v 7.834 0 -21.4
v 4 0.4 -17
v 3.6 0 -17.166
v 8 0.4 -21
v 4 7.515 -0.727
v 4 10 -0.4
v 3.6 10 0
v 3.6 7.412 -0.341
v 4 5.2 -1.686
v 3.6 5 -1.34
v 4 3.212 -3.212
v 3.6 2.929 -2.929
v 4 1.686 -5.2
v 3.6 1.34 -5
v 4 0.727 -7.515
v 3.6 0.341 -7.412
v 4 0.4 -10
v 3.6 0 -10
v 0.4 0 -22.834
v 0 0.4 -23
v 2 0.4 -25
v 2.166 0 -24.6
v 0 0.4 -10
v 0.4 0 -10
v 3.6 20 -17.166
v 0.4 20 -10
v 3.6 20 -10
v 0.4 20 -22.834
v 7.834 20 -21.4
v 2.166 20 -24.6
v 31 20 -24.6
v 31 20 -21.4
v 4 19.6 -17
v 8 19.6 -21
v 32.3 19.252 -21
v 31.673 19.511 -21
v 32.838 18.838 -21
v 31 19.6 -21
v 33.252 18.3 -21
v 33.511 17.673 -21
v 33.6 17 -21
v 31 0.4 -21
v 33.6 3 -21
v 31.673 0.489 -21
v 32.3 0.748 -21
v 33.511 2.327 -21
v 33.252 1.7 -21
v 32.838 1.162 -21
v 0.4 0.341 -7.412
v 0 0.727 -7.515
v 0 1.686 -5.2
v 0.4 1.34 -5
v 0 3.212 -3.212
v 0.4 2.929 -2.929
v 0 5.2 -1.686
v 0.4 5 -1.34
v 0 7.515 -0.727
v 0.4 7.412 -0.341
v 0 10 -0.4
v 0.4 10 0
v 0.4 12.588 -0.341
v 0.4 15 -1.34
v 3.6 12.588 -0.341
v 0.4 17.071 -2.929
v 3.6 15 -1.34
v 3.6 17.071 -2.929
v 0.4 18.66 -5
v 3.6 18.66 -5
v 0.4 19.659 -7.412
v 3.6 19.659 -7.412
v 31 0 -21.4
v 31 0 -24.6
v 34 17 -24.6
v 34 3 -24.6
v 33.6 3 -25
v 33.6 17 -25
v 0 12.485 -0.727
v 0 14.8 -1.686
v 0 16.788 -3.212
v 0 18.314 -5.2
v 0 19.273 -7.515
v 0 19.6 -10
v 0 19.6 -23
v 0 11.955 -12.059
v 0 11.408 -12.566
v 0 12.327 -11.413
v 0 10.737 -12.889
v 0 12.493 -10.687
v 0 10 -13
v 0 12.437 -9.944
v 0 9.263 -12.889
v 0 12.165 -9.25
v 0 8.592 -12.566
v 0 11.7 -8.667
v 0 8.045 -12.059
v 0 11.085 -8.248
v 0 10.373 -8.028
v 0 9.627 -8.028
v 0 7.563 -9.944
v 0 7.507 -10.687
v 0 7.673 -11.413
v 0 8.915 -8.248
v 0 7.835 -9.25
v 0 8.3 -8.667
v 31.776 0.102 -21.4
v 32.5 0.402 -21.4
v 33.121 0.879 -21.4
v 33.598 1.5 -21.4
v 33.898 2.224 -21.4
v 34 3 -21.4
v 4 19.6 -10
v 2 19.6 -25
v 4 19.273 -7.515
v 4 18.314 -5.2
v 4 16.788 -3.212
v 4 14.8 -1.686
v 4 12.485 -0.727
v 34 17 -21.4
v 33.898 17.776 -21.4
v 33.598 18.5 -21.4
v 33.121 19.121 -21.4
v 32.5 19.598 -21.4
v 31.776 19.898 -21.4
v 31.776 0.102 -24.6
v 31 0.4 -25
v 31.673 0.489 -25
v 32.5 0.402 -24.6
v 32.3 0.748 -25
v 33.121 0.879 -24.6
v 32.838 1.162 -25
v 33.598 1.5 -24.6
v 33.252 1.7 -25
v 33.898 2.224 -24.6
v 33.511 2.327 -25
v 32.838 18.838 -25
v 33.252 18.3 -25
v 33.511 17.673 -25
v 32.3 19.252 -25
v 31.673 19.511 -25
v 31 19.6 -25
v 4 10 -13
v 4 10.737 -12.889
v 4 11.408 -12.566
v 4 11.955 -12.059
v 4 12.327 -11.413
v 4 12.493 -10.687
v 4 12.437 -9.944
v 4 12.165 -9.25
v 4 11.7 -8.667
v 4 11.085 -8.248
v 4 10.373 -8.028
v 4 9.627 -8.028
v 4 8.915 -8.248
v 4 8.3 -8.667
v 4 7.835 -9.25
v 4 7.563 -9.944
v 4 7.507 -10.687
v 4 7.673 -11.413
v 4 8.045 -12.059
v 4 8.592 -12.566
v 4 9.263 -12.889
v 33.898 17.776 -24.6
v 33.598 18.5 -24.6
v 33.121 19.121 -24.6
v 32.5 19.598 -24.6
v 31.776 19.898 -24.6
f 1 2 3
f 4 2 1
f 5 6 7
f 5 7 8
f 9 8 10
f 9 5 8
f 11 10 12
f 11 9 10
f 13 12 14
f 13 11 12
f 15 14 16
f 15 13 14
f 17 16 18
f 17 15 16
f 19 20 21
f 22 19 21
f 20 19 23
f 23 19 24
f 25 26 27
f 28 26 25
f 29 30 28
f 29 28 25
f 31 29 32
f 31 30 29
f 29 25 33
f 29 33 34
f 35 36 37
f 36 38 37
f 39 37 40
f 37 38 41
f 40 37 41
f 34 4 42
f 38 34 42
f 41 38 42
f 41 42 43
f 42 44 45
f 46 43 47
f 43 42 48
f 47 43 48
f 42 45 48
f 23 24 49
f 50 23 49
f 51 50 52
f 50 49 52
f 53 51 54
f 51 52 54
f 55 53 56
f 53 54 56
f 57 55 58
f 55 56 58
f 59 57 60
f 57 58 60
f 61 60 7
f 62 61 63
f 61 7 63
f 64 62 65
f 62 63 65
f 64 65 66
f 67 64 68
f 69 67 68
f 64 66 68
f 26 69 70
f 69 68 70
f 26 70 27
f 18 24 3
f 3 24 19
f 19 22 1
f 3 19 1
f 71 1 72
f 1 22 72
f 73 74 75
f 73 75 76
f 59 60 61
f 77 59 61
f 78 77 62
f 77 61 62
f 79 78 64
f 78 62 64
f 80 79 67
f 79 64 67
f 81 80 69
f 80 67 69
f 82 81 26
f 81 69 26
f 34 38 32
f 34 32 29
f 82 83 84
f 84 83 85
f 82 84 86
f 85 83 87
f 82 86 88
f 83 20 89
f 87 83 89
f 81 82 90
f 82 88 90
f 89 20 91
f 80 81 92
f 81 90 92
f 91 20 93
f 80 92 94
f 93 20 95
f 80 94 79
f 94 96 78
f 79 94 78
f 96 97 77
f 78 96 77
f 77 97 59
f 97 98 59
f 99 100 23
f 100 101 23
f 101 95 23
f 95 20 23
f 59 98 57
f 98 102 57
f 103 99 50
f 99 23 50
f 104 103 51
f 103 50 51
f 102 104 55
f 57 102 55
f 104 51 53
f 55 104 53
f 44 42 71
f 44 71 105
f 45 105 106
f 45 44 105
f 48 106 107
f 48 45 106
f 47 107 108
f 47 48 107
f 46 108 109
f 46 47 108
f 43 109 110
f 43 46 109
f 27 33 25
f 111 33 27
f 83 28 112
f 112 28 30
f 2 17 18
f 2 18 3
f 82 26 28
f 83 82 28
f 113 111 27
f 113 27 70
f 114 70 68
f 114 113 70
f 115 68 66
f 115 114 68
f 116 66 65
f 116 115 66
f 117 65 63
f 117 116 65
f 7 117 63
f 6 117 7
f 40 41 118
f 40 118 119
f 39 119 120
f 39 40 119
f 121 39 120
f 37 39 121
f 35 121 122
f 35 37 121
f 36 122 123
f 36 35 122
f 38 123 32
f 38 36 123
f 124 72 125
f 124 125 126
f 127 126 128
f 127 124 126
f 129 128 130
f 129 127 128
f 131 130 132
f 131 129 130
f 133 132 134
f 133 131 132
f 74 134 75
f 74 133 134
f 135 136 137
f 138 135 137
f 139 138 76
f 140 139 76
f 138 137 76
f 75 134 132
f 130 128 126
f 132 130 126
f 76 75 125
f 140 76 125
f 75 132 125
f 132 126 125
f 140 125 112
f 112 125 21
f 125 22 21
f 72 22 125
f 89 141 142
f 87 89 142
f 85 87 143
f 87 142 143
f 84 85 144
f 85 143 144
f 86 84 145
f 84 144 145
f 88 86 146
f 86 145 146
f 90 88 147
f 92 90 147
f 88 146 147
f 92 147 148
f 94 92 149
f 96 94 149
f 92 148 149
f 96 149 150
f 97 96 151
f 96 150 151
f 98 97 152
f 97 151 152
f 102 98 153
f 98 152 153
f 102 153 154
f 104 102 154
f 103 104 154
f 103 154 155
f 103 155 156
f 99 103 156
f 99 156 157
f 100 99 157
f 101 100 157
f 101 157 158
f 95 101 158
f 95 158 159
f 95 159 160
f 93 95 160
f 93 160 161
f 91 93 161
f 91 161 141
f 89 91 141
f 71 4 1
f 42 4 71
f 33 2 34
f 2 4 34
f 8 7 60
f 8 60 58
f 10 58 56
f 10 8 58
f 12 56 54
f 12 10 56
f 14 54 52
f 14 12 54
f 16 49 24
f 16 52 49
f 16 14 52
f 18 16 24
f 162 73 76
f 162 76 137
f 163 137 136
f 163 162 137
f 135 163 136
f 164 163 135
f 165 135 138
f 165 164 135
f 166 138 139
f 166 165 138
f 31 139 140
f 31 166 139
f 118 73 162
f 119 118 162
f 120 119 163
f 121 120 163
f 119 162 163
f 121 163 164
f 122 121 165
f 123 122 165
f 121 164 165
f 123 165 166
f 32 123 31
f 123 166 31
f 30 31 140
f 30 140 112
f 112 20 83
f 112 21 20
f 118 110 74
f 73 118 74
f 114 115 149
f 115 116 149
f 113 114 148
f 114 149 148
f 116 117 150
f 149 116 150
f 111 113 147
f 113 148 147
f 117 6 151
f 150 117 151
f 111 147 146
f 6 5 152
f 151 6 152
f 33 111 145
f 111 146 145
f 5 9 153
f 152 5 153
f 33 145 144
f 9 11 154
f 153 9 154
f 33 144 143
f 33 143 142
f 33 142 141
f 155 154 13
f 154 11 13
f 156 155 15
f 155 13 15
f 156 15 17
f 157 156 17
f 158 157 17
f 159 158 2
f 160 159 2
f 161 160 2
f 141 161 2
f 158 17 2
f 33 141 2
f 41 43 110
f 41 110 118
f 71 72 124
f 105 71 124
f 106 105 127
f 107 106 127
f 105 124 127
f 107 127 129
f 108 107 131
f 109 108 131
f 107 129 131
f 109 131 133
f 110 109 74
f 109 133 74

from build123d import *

# Parameters (mm, degrees)
EXTRUDE_1_DEPTH     = 20
SKETCH_2_R          = 2.5
CUT_EXTRUDE_1_DEPTH = 20
FILLET_1_R          = 10
CHAMFER_1_SIZE      = 4
CHAMFER_2_SIZE      = 2
FILLET_2_R          = 3
CHAMFER_3_SIZE      = 0.4


with BuildPart() as part:
    # 草图1 → 凸台-拉伸1 (new body)
    with BuildSketch(Plane(origin=(0, 0, 0), x_dir=(1, 0, 0), z_dir=(0, 1, 0))):
        Polygon((0, 0), (4, 0), (4, 21), (34, 21), (34, 25), (4, 25), (0, 25), align=None)
    extrude(amount=EXTRUDE_1_DEPTH)

    # 草图2 → 切除-拉伸1 (cut)
    with BuildSketch(Plane(origin=(4, 0, 0), x_dir=(0, 0, -1), z_dir=(1, 0, 0))):
        with Locations((10.5, 10)):
            Circle(SKETCH_2_R)
    extrude(amount=-CUT_EXTRUDE_1_DEPTH, mode=Mode.SUBTRACT)

    # 圆角1
    fillet_1_edges = [part.edges().sort_by_distance(p)[0] for p in [
        (2, 0, 0),
        (2, 20, 0),
    ]]
    fillet(fillet_1_edges, radius=FILLET_1_R - 0.0001)  # a hair under: the kernel refuses the full size

    # 倒角1
    chamfer_1_edges = [part.edges().sort_by_distance(p)[0] for p in [
        (4, 10, -21),
    ]]
    chamfer(chamfer_1_edges, length=CHAMFER_1_SIZE)

    # 倒角2
    chamfer_2_edges = [part.edges().sort_by_distance(p)[0] for p in [
        (0, 10, -25),
    ]]
    chamfer(chamfer_2_edges, length=CHAMFER_2_SIZE)

    # 圆角2
    fillet_2_edges = [part.edges().sort_by_distance(p)[0] for p in [
        (34, 20, -23),
        (34, 0, -23),
    ]]
    fillet(fillet_2_edges, radius=FILLET_2_R)

    # 倒角3
    chamfer_3_edges = [part.edges().sort_by_distance(p)[0] for p in [
        (4, 0, -13.49995),
        (4, 20, -13.49995),
        (4, 17.071097101, -2.928902899),
        (4, 2.928902899, -2.928902899),
        (0, 17.071097101, -2.928902899),
        (0, 2.928902899, -2.928902899),
        (19.5, 0, -21),
        (19.5, 20, -21),
        (6, 0, -19),
        (6, 20, -19),
        (0, 0, -16.49995),
        (0, 20, -16.49995),
        (1, 0, -24),
        (1, 20, -24),
        (34, 10, -25),
        (34, 10, -21),
        (16.5, 0, -25),
        (16.5, 20, -25),
        (33.121320344, 19.121320344, -25),
        (33.121320344, 0.878679656, -25),
        (33.121320344, 19.121320344, -21),
        (33.121320344, 0.878679656, -21),
    ]]
    chamfer(chamfer_3_edges, length=CHAMFER_3_SIZE)


solid = part.part
